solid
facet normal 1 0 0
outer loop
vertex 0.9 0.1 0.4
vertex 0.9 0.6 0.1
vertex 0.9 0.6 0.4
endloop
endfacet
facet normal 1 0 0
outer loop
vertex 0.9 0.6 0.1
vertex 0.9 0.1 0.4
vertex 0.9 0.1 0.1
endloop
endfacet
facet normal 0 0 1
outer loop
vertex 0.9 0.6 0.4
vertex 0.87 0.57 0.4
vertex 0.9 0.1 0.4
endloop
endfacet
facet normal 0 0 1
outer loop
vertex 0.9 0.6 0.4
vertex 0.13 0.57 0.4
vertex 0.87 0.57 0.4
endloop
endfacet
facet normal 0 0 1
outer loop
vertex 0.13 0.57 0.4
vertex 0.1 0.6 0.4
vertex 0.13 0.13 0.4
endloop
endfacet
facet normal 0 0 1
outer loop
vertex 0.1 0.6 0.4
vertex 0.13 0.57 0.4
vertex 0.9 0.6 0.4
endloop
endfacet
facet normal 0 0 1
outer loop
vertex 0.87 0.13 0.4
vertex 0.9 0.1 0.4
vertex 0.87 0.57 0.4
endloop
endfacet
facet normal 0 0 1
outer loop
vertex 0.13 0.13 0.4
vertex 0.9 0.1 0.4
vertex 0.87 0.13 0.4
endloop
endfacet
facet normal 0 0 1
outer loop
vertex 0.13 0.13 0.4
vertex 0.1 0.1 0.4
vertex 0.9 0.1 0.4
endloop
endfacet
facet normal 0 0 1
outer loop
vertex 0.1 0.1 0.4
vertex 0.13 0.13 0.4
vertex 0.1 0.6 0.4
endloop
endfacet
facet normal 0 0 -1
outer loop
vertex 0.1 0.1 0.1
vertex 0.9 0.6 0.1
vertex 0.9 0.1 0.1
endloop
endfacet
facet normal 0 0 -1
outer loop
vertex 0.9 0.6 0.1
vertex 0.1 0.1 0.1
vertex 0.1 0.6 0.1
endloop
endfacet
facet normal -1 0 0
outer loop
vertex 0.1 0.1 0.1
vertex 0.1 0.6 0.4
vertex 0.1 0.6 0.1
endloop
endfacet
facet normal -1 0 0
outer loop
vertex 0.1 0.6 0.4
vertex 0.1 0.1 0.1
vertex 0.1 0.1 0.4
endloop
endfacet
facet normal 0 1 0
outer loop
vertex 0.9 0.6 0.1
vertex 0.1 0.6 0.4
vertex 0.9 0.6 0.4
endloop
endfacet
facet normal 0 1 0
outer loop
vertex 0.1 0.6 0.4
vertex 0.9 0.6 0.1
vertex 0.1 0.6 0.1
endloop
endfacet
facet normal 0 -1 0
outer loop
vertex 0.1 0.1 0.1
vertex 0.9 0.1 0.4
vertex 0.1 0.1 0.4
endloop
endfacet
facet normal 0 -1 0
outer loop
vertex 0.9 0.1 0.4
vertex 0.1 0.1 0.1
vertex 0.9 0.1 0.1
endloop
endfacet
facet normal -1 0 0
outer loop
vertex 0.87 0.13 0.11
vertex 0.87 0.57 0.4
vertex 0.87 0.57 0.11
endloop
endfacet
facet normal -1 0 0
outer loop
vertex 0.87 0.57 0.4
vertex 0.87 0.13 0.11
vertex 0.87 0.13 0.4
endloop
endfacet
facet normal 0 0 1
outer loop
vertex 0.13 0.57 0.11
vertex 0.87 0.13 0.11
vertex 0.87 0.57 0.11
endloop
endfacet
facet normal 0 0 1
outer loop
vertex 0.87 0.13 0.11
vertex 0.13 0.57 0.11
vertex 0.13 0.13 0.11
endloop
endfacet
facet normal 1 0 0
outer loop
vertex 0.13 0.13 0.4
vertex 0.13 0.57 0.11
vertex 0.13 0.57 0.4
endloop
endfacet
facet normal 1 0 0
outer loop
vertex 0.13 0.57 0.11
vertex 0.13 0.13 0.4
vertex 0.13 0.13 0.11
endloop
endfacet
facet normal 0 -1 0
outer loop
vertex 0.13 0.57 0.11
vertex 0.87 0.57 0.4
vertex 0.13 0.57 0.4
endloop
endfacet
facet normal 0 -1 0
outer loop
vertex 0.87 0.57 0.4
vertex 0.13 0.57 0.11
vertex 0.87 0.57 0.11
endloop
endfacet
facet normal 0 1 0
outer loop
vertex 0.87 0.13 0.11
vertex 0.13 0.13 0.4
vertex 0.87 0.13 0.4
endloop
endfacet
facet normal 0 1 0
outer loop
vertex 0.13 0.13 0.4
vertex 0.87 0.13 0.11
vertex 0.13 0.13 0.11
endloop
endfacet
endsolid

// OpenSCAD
translate([0.1, 0.1, 0.1])
difference() {
    cube([0.8, 0.5, 0.3]);
    translate([0.03, 0.03, 0.01])
    cube([0.74, 0.44, 0.3]);
};
